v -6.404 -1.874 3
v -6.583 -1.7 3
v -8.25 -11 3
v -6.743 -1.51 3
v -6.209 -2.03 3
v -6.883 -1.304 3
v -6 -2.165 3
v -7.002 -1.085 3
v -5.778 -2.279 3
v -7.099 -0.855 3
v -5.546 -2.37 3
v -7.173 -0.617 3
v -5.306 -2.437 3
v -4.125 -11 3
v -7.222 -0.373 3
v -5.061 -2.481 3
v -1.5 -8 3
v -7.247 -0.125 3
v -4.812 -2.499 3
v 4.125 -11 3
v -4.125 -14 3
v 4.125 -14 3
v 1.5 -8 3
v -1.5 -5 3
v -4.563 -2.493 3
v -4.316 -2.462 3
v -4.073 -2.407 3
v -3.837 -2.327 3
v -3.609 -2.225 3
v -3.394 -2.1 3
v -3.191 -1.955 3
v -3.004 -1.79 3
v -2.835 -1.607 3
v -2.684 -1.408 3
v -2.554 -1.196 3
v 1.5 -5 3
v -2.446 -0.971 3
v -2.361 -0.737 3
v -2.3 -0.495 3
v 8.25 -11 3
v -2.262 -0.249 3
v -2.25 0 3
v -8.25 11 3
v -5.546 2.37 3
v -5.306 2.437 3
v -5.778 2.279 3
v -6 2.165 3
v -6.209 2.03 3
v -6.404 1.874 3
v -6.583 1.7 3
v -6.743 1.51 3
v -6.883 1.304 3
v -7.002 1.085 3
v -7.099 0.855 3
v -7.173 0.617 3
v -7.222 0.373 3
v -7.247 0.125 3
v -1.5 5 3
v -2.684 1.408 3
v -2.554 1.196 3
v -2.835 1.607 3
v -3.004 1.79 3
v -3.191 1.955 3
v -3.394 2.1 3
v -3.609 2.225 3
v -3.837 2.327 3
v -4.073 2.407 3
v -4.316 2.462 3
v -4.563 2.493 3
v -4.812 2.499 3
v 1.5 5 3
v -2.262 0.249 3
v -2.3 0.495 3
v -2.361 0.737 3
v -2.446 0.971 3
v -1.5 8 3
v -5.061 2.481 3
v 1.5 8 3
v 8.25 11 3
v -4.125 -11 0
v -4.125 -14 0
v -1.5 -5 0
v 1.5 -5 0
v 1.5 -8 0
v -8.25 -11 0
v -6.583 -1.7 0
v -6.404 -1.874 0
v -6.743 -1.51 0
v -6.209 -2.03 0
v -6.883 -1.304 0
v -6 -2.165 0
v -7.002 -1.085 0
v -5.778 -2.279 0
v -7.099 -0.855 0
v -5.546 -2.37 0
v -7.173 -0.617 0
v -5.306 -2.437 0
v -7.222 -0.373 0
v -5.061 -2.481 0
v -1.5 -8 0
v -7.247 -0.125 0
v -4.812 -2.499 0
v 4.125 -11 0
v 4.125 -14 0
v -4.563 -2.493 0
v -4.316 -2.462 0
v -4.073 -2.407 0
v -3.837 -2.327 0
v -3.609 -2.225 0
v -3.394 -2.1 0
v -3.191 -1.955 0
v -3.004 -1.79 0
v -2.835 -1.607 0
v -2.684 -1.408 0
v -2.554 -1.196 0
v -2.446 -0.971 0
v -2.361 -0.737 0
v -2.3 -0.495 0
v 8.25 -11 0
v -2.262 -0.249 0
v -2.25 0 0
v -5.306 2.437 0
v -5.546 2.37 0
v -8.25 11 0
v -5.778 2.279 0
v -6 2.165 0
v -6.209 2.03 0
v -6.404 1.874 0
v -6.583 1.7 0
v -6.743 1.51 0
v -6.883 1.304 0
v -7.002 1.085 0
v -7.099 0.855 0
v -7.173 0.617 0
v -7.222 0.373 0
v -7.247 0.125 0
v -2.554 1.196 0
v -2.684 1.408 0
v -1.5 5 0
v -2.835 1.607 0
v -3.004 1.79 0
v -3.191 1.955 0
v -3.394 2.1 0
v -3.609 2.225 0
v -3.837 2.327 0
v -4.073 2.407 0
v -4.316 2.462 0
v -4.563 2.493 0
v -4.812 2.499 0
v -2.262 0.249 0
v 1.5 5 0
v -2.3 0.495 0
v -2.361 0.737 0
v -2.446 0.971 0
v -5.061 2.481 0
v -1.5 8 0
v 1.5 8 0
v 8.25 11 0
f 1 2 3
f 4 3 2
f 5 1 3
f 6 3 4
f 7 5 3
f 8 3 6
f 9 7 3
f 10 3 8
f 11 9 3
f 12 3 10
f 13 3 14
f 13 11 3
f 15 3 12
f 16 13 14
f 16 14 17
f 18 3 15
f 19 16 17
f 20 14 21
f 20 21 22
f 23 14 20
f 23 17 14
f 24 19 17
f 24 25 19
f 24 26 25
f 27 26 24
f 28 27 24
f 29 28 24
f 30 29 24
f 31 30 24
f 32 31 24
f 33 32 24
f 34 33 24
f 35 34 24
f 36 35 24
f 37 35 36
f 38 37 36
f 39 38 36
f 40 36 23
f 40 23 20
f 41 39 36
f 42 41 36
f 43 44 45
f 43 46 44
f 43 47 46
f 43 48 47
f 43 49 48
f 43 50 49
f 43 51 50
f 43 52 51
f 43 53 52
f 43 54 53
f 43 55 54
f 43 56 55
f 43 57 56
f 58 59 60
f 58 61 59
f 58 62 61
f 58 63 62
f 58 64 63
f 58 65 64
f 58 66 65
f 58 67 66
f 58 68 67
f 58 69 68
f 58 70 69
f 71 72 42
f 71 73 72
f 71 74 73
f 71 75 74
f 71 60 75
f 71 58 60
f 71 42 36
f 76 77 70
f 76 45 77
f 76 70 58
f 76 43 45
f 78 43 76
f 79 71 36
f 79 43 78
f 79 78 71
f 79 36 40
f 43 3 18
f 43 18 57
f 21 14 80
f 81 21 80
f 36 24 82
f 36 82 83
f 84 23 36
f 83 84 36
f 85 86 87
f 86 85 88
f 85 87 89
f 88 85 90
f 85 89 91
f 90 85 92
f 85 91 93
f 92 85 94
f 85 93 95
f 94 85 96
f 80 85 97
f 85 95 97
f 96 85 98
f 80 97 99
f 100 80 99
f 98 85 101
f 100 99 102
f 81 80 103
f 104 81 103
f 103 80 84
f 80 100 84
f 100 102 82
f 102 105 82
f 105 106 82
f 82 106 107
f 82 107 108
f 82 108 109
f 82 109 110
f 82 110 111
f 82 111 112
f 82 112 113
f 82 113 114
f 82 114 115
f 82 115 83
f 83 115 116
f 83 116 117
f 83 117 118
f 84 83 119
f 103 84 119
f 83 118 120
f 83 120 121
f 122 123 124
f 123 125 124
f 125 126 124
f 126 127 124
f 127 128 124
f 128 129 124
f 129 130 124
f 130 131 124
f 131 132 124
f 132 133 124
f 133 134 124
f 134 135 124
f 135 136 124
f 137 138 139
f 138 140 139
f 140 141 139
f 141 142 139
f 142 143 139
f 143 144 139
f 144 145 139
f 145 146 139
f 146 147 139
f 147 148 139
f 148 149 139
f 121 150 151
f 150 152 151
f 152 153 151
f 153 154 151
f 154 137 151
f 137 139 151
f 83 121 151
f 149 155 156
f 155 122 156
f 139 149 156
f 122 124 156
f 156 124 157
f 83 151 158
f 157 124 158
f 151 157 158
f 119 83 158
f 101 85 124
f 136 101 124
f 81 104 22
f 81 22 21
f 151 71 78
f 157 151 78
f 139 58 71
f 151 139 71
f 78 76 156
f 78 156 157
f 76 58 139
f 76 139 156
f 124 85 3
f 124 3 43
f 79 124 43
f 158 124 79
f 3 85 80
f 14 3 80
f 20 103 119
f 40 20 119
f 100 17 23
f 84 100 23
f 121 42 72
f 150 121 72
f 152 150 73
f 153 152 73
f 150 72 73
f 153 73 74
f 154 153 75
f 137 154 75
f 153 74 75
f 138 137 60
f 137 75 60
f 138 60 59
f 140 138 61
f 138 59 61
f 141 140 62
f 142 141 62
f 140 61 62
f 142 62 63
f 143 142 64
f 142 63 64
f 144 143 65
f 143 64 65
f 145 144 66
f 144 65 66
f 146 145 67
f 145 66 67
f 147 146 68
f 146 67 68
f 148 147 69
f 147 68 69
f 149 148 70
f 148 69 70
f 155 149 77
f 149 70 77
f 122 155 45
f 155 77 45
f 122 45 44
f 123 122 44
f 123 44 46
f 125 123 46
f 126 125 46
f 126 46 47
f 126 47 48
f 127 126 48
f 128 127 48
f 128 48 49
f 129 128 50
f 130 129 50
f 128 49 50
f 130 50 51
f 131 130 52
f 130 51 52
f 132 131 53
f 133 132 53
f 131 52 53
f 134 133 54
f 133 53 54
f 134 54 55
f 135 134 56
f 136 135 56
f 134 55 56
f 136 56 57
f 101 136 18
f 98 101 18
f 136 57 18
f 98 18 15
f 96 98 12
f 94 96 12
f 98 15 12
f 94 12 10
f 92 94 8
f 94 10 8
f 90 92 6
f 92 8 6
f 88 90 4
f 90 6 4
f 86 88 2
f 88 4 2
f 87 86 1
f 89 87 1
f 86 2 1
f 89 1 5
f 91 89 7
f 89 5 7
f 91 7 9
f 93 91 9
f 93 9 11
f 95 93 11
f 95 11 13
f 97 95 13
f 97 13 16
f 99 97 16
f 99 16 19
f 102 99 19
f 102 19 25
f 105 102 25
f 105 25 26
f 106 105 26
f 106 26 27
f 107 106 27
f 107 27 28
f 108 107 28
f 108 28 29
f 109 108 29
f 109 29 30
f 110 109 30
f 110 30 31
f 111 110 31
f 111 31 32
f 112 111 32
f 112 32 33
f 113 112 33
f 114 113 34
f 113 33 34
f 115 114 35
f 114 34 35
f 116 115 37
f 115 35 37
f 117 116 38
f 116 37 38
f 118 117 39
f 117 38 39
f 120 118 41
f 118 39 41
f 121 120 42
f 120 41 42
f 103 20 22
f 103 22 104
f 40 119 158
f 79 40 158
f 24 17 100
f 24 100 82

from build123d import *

# Parameters (mm, degrees)
SKETCH1_W           = 16.5
SKETCH1_H           = 22
BOSS_EXTRUDE1_DEPTH = 3
SKETCH2_W           = 8.25
SKETCH2_H           = 3
BOSS_EXTRUDE2_DEPTH = 3
SKETCH3_W           = 3
SKETCH3_H           = 3
CUT_EXTRUDE1_DEPTH  = 3
SKETCH4_R           = 2.5
CUT_EXTRUDE2_DEPTH  = 3


with BuildPart() as part:
    # Sketch1 → Boss-Extrude1 (new body)
    with BuildSketch(Plane.XY):
        Rectangle(SKETCH1_W, SKETCH1_H)
    extrude(amount=BOSS_EXTRUDE1_DEPTH)

    # Sketch2 → Boss-Extrude2 (add)
    with BuildSketch(Plane(origin=(0, -11, 0), x_dir=(-1, 0, 0), z_dir=(0, -1, 0))):
        with Locations((0, -1.5)):
            Rectangle(SKETCH2_W, SKETCH2_H)
    extrude(amount=BOSS_EXTRUDE2_DEPTH)

    # Sketch3 → Cut-Extrude1 (cut)
    with BuildSketch(Plane.XY.offset(3)):
        with Locations((0, 6.5)):
            Rectangle(SKETCH3_W, SKETCH3_H)
        with Locations((0, -6.5)):
            Rectangle(SKETCH3_W, SKETCH3_H)
    extrude(amount=-CUT_EXTRUDE1_DEPTH, mode=Mode.SUBTRACT)

    # Sketch4 → Cut-Extrude2 (cut)
    with BuildSketch(Plane.XY.offset(3)):
        with Locations((-4.75, 0)):
            Circle(SKETCH4_R)
    extrude(amount=-CUT_EXTRUDE2_DEPTH, mode=Mode.SUBTRACT)


solid = part.part
